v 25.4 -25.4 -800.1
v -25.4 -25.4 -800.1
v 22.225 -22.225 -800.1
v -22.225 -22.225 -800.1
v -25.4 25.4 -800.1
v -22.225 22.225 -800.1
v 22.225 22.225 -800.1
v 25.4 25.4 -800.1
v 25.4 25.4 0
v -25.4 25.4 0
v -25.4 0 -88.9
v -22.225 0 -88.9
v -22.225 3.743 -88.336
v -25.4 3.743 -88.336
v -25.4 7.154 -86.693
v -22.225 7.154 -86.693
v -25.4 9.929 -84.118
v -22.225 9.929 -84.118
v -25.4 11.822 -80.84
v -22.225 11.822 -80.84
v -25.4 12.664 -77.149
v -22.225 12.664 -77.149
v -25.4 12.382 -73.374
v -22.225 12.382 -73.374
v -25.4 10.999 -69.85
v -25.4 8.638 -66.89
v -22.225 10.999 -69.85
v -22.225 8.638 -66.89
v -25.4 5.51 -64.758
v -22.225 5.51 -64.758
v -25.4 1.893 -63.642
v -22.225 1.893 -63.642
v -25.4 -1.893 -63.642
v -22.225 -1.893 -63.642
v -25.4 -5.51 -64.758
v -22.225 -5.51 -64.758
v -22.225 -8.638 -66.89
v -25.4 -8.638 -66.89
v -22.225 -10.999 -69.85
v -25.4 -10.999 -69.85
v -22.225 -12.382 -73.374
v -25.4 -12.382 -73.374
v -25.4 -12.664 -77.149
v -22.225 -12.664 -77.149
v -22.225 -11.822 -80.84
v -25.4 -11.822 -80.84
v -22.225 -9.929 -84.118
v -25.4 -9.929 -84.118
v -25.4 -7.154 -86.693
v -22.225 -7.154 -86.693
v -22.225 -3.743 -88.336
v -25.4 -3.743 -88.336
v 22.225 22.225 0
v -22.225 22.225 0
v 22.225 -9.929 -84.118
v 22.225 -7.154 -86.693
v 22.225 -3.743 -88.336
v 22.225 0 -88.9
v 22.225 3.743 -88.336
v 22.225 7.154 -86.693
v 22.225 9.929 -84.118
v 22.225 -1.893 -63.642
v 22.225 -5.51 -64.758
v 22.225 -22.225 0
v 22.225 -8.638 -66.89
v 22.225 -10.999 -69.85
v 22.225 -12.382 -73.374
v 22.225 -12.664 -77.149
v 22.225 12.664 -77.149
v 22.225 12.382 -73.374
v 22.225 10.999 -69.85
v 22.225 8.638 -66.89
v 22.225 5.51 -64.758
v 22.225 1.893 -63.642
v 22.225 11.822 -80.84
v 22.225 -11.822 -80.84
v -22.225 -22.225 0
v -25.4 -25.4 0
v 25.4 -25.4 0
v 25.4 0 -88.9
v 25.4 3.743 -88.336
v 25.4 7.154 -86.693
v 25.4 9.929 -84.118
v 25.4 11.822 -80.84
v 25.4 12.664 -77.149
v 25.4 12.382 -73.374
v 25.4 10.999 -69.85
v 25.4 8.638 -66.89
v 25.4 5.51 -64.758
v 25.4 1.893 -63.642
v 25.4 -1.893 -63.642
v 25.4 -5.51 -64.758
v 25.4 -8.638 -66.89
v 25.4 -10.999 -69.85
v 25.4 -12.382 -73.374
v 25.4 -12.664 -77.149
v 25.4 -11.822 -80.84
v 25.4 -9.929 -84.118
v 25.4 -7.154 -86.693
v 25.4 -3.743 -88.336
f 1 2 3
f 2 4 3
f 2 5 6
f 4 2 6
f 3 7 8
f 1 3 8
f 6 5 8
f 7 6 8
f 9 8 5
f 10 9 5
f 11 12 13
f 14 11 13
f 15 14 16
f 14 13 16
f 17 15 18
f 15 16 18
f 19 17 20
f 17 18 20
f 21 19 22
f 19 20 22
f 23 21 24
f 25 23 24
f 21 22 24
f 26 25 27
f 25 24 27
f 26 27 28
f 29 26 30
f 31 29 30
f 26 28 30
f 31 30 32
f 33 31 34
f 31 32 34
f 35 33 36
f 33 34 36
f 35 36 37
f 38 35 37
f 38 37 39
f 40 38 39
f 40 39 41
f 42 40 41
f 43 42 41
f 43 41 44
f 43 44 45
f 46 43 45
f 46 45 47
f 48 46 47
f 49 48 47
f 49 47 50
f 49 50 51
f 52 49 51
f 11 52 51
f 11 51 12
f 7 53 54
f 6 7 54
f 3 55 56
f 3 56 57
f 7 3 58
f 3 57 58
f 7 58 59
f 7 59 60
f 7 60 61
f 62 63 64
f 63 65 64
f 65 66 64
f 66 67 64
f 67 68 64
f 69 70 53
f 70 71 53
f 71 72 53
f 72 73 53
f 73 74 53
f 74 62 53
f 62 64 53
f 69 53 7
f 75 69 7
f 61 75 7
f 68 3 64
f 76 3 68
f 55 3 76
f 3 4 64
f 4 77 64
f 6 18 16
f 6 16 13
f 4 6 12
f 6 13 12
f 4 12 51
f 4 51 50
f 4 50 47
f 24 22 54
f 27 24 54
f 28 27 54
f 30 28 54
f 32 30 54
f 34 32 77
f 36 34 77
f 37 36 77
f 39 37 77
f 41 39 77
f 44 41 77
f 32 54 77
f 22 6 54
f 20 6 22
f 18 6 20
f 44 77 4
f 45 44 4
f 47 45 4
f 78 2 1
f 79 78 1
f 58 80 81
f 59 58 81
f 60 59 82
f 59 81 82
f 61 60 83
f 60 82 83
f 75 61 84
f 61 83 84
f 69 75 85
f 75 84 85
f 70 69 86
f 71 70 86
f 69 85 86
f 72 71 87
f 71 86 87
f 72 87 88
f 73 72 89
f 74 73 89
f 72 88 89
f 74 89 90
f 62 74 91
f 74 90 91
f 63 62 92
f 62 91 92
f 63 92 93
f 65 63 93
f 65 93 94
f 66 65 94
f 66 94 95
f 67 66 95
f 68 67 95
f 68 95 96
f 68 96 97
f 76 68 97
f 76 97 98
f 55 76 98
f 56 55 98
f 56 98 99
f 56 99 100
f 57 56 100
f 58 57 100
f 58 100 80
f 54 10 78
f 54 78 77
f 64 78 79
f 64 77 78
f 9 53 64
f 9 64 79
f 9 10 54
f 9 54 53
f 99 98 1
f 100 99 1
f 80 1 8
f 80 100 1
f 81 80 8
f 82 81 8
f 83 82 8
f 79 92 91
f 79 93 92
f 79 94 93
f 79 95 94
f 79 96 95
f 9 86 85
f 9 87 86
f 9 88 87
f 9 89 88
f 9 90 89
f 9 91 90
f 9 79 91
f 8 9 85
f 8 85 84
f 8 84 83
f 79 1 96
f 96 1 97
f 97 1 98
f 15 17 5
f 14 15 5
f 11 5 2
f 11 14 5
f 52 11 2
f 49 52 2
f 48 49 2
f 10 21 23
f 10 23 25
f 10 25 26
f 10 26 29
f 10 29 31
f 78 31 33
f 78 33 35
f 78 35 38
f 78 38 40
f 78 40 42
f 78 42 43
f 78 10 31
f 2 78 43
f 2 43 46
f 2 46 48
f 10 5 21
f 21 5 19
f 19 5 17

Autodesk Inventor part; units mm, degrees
ref_plane "XZ Plane" through (0, 0, 0) normal (0, 1, 0) x (-1, 0, 0)
ref_plane "XY Plane" through (0, 0, 0) normal (0, 0, 1) x (1, 0, 0)
sketch "Sketch1" plane through (0, 0, 0) normal (0, 0, 1) x (1, 0, 0)
  line L0 (-25.4, -25.4) -> (25.4, -25.4)
  line L1 (25.4, -25.4) -> (25.4, 25.4)
  line L2 (25.4, 25.4) -> (-25.4, 25.4)
  line L3 (-25.4, 25.4) -> (-25.4, -25.4)
  line L4 (-25.4, -25.4) -> (25.4, 25.4) construction
  line L5 (25.4, -25.4) -> (-25.4, 25.4) construction
  line L6 (-22.225, -22.225) -> (22.225, -22.225)
  line L7 (22.225, -22.225) -> (22.225, 22.225)
  line L8 (22.225, 22.225) -> (-22.225, 22.225)
  line L9 (-22.225, 22.225) -> (-22.225, -22.225)
  line L10 (-22.225, -22.225) -> (22.225, 22.225) construction
  line L11 (22.225, -22.225) -> (-22.225, 22.225) construction
  point P0 (0, 0)
  dimension "d0" = 50.8
  dimension "d1" = 3.175
extrude "Extrusion1" add sketch "Sketch1" against normal blind 800.1
sketch "Sketch2" plane through (25.4, -25.4, 0) normal (1, 0, 0) x (0, 0, -1)
  circle A0 centre (76.2, 25.4) radius 12.7
  line L0 (0, 0) -> (0, 50.8) projected
  point P0 (0, 25.4)
  dimension "d4" = 25.4
  dimension "d7" = 76.2
extrude "Extrusion2" cut sketch "Sketch2" against normal through all
properties part number "2inSquareArmTube"
